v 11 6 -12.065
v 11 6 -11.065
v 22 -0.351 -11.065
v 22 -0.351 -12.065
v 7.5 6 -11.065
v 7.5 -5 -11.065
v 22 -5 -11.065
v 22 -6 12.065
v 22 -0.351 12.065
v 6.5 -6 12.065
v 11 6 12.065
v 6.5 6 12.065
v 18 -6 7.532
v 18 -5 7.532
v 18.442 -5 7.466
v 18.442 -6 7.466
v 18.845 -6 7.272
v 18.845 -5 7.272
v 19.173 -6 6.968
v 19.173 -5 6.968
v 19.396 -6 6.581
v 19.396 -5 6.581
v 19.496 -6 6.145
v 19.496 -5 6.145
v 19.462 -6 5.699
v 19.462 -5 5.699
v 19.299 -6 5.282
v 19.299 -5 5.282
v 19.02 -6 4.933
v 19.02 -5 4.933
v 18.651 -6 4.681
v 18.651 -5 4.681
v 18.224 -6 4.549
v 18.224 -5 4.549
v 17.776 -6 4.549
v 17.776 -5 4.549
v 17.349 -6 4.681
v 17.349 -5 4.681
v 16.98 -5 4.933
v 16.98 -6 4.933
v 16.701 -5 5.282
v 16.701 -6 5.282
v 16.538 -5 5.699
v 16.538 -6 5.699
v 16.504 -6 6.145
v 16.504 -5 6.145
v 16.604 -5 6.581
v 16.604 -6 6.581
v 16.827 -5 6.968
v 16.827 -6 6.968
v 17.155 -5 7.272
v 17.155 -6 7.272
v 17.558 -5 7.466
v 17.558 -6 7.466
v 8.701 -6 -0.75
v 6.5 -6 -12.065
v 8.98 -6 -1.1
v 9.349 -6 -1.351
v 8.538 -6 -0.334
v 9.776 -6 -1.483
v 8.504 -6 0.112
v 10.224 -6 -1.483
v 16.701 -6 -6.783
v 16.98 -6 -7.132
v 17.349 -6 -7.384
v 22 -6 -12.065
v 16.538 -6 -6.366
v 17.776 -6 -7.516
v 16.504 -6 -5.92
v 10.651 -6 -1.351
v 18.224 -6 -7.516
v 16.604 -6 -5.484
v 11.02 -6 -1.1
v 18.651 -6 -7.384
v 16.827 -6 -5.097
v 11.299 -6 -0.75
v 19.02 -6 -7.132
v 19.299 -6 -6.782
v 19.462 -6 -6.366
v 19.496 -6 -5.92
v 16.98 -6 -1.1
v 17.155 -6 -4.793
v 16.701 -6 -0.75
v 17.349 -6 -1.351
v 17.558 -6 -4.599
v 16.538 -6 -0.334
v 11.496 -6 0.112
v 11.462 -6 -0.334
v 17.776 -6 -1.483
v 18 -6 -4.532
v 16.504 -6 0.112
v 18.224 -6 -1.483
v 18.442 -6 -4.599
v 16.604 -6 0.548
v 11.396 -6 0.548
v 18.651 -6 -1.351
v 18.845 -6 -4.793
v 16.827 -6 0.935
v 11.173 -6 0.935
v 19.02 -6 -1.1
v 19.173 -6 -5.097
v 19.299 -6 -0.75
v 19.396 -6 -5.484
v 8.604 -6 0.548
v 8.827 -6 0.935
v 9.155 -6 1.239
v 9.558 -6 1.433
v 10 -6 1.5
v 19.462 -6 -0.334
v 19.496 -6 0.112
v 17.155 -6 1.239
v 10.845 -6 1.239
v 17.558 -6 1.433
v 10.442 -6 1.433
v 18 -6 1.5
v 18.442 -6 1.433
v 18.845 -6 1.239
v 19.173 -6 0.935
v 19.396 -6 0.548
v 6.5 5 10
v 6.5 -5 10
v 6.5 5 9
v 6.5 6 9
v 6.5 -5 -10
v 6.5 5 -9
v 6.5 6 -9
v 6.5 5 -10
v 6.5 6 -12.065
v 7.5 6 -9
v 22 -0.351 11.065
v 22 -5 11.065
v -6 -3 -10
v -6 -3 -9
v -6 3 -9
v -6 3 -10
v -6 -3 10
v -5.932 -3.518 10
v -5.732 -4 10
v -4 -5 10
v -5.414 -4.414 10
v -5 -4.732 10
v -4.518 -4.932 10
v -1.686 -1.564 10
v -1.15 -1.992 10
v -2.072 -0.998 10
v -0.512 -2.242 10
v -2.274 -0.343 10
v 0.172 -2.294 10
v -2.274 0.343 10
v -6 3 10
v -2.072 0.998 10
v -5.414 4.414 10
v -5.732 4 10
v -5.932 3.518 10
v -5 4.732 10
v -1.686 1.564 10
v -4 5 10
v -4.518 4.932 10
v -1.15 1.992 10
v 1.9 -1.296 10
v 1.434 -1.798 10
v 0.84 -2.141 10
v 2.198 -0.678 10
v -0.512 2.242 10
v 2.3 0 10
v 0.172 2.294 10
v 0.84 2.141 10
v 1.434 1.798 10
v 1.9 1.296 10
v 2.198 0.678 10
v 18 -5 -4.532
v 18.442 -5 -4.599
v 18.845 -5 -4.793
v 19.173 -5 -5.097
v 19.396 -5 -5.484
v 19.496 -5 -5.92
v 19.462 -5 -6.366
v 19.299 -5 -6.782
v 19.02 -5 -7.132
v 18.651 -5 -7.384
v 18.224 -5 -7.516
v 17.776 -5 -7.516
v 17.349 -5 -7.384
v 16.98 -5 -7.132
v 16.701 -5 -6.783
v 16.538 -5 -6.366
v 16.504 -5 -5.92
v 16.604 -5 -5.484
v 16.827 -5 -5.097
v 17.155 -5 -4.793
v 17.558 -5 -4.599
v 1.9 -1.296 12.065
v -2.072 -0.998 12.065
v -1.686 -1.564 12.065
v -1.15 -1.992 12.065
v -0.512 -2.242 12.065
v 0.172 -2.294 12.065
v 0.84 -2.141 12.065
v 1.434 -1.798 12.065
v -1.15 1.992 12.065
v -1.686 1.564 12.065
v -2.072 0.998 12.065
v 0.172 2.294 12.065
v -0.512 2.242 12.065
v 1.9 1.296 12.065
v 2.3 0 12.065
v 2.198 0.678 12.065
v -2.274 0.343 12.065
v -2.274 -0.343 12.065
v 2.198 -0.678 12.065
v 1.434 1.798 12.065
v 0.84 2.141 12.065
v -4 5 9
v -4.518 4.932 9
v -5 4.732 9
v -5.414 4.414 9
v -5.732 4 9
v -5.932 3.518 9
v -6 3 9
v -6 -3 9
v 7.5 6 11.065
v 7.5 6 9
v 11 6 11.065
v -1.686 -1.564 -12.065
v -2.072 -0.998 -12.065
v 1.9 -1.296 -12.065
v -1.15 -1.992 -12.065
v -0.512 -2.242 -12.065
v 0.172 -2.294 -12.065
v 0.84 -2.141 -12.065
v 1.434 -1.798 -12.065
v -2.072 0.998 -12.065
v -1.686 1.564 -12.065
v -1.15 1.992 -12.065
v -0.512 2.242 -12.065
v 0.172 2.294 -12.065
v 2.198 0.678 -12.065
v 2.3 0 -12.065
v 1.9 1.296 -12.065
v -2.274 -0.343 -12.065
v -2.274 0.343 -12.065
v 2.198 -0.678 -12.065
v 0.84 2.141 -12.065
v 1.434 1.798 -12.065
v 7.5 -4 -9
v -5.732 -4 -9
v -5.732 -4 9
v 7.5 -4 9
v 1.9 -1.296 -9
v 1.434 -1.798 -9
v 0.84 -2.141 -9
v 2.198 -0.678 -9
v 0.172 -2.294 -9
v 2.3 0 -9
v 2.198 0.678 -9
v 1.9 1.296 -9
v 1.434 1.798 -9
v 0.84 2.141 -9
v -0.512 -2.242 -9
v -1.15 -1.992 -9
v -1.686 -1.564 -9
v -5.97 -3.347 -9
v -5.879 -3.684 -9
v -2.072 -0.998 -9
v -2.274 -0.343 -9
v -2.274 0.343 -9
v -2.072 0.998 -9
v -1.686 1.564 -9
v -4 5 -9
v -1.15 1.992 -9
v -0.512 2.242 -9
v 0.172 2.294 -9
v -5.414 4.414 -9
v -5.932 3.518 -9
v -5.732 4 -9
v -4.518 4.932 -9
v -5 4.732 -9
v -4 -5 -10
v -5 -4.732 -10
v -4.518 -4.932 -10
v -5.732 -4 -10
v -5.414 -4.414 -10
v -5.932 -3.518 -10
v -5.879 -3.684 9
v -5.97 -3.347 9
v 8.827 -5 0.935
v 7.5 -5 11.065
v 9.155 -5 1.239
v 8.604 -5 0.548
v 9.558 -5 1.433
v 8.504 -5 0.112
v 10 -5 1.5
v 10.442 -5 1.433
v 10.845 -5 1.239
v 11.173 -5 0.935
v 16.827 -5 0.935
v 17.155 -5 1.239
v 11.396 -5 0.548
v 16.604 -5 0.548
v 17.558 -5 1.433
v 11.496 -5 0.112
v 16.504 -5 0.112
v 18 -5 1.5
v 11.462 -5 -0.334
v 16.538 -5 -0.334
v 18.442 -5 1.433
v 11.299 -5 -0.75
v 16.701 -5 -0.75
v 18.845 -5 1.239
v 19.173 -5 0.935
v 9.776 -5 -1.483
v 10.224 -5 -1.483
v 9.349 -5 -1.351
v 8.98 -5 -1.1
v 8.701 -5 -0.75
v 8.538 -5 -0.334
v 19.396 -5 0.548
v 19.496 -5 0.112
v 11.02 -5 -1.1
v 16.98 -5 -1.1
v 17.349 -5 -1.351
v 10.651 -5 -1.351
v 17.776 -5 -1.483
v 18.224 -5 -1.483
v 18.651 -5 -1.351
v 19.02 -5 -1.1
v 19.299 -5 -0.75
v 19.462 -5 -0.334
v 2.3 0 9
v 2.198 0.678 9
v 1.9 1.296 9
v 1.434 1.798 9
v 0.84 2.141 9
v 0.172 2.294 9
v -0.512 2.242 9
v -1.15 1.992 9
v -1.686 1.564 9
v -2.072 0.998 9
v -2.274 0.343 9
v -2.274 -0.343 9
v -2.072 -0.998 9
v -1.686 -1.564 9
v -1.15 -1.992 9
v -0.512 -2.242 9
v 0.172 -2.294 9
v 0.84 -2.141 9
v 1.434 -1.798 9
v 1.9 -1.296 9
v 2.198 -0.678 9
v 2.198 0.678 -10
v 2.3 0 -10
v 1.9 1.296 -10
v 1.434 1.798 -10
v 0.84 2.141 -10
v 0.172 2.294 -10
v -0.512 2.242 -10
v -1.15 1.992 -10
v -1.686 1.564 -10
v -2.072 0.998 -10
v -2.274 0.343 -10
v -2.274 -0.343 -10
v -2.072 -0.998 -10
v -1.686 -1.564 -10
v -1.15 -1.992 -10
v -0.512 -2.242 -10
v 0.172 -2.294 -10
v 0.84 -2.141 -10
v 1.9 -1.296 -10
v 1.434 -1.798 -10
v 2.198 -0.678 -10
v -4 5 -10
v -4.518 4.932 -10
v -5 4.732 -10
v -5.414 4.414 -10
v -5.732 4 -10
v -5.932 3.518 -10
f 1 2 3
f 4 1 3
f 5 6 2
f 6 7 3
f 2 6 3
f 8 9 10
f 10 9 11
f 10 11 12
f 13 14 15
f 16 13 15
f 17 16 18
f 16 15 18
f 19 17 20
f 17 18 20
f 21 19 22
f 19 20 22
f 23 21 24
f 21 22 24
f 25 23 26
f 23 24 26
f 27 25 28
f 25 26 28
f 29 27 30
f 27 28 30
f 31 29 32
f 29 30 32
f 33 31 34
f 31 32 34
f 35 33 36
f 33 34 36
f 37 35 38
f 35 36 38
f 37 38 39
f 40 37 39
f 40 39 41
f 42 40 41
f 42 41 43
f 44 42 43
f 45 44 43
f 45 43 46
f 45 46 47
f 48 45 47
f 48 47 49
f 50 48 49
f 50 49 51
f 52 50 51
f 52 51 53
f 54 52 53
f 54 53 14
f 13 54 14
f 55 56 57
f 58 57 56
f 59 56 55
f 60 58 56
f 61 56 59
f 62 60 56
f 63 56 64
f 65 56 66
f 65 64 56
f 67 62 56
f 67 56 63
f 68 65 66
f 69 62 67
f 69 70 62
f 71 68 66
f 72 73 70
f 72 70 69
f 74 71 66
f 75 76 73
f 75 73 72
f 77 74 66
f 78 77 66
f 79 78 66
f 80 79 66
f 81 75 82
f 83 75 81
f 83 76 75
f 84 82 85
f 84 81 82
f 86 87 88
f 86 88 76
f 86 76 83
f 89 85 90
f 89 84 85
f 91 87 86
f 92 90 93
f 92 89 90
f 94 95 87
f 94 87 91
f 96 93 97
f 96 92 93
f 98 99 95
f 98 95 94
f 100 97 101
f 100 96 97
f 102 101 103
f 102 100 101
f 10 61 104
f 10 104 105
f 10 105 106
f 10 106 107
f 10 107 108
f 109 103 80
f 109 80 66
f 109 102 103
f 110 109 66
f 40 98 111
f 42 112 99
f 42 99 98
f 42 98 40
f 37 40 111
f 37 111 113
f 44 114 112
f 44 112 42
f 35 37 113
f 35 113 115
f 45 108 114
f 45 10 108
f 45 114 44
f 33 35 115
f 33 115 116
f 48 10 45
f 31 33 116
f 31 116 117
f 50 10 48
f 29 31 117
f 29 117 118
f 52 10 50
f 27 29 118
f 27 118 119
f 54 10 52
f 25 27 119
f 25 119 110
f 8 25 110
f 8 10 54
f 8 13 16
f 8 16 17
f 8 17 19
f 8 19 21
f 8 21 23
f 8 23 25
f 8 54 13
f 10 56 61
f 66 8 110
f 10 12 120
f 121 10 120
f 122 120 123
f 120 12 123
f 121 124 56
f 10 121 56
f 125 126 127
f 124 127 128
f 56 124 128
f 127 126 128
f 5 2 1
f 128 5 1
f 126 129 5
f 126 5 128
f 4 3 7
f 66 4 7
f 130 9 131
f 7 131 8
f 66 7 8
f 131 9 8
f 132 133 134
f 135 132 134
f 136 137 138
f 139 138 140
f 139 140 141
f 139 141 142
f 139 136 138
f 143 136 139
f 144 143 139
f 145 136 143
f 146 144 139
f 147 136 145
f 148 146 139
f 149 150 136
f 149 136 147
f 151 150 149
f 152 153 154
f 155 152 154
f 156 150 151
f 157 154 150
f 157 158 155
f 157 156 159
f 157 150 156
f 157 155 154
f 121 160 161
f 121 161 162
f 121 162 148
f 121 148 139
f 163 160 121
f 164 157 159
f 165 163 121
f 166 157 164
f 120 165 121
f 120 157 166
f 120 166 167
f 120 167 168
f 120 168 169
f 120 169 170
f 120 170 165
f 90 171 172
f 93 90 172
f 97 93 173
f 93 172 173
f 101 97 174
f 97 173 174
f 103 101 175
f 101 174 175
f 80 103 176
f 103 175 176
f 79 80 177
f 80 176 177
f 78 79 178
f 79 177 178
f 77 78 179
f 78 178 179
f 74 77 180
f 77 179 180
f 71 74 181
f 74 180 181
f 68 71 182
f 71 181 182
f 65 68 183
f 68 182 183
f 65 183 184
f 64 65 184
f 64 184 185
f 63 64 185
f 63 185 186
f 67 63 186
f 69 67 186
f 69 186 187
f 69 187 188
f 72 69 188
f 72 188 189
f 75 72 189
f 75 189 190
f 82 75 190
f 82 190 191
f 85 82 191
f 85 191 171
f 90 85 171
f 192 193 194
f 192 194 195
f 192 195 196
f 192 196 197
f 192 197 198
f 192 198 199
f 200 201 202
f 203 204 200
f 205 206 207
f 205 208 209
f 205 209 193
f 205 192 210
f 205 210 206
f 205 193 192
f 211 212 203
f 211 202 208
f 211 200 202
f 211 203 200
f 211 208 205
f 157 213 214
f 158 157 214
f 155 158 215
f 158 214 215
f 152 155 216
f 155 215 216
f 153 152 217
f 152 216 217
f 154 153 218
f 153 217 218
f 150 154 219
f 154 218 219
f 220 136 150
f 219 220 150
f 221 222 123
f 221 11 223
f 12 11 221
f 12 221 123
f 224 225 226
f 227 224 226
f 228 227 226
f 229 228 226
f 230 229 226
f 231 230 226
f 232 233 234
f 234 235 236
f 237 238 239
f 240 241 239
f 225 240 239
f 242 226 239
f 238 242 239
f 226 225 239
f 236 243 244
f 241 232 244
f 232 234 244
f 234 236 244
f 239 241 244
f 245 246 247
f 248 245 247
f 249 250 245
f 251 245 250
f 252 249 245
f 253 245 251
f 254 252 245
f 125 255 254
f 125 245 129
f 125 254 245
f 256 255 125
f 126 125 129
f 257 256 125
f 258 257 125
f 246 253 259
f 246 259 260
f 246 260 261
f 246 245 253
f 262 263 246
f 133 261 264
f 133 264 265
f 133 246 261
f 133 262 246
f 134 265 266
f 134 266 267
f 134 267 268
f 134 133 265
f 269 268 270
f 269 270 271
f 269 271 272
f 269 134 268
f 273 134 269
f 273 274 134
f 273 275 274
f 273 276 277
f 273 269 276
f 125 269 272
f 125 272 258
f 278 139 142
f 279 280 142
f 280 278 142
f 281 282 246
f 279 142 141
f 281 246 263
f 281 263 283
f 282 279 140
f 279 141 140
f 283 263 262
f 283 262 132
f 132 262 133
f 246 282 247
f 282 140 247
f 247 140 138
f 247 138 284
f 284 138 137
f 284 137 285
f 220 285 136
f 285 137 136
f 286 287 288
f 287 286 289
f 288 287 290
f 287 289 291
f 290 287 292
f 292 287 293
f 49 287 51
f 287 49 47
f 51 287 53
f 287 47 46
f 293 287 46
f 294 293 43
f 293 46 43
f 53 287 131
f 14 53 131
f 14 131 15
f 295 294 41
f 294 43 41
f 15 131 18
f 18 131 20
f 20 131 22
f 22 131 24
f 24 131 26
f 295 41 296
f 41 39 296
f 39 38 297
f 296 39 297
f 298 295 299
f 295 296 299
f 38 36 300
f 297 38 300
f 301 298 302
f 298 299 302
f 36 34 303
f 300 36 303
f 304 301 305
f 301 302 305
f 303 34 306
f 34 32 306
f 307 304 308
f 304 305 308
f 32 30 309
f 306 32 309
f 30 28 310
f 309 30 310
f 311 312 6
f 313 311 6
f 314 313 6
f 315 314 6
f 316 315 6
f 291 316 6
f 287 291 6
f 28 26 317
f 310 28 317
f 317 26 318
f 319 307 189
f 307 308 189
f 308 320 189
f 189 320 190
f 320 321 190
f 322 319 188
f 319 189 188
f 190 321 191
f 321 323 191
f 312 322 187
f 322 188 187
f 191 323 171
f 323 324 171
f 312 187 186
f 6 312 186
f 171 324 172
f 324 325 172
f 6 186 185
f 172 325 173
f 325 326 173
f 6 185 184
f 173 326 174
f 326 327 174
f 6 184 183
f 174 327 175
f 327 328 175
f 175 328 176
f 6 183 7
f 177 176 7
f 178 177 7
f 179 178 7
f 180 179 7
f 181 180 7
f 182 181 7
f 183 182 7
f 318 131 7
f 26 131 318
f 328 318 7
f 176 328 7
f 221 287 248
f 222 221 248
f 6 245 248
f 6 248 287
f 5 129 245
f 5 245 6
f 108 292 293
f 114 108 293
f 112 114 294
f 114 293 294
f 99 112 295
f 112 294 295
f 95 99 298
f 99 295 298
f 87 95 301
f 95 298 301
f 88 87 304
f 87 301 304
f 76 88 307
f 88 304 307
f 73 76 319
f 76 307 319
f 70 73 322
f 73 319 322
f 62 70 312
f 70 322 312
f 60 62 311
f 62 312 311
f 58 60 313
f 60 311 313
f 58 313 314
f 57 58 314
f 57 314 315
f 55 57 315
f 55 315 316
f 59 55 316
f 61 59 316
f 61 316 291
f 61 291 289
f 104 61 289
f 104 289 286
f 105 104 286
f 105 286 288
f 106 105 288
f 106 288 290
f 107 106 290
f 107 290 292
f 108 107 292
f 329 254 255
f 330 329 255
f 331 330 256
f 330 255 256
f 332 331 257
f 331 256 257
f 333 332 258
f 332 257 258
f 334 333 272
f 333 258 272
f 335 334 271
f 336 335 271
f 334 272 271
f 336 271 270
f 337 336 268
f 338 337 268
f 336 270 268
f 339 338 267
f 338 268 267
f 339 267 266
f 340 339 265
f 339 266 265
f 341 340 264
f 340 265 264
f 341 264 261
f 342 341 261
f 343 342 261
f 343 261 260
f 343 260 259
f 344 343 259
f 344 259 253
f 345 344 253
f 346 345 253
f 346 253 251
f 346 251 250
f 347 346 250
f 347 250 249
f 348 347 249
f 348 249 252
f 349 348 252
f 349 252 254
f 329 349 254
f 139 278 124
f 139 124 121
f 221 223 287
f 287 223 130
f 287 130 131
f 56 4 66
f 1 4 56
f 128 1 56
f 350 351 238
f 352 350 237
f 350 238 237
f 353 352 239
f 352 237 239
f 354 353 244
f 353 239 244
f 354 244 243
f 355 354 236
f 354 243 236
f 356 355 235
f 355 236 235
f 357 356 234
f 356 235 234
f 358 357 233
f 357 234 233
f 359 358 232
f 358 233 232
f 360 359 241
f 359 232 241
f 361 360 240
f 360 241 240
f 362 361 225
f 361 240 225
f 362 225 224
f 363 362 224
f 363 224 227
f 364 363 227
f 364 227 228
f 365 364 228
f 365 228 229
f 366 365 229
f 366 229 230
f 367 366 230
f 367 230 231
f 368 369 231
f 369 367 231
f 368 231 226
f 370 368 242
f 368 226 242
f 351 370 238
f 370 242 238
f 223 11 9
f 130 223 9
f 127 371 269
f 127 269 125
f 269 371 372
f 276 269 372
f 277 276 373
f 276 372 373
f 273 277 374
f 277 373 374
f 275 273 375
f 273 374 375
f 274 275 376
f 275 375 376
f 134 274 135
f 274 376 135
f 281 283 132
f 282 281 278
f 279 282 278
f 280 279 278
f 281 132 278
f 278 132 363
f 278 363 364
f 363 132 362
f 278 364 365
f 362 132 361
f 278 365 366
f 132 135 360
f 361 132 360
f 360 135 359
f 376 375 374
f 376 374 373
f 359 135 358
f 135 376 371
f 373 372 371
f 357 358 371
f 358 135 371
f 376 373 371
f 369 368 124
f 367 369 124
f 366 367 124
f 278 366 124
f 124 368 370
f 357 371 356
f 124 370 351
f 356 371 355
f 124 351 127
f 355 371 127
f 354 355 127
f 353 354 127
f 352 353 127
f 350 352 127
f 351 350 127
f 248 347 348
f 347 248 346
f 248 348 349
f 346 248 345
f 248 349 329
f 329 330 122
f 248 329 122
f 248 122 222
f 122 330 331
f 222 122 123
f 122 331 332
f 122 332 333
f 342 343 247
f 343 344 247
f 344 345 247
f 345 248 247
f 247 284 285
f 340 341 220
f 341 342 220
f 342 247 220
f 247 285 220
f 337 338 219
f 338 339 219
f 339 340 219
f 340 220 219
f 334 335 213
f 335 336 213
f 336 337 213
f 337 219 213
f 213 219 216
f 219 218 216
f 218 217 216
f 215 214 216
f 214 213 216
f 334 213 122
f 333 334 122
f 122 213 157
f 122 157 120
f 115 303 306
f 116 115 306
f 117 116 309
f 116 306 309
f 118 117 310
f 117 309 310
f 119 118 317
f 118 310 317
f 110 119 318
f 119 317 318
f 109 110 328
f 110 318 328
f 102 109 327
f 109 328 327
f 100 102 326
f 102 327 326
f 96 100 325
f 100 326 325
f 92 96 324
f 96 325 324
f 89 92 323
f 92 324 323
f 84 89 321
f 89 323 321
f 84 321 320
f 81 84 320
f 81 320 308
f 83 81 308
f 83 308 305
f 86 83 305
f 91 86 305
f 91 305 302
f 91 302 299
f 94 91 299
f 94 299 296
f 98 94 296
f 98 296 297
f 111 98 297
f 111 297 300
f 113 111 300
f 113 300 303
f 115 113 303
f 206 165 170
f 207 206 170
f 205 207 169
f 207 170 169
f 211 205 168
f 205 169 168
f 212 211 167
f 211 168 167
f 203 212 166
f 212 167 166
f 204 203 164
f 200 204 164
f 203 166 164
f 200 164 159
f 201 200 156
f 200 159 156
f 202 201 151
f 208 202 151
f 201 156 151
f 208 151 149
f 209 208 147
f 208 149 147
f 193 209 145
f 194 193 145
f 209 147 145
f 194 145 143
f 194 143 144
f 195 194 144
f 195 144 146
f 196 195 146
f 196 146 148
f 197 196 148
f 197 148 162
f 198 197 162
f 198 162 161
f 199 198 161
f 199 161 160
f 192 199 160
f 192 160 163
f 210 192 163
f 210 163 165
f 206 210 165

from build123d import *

# Parameters (mm, degrees)
SKETCH1_R           = 2.3
BOSS_EXTRUDE1_DEPTH = 12.065
SKETCH5_R           = 1.5
SKETCH5_W           = 12.5
SKETCH5_H           = 2.065
CUT_EXTRUDE3_DEPTH  = 28.813022579
SKETCH6_W           = 18
SKETCH6_H           = 10
CUT_EXTRUDE5_DEPTH  = 32.07352933
SKETCH9_W           = 20
SKETCH9_H           = 1
CUT_EXTRUDE8_DEPTH  = 12.5
BOSS_EXTRUDE2_START = -24.13
SKETCH7_R           = 2.3
BOSS_EXTRUDE2_DEPTH = 24.13
SKETCH8_W           = 12.5
SKETCH8_H           = 1
CUT_EXTRUDE6_DEPTH  = 1
FILLET3_R           = 2
CUT_EXTRUDE9_DEPTH  = 14.5


with BuildPart() as part:
    # Sketch1 → Boss-Extrude1 (new, symmetric)
    with BuildSketch(Plane.XY):
        Polygon((22, -6), (0, -6), (-6, -6), (-6, 6), (0, 6), (11, 6), (22, -0.350852961), align=None)
        with Locations(Location((0, 0, 0), (0, 0, 180))):
            Circle(SKETCH1_R, mode=Mode.SUBTRACT)
    extrude(amount=BOSS_EXTRUDE1_DEPTH, both=True)

    # Sketch5 → Cut-Extrude3 (cut, through all)
    with BuildSketch(Plane(origin=(0, 6, 0), x_dir=(1, 0, 0), z_dir=(0, 1, 0))):
        with Locations(Location((18, 6.0325, 0), (0, 0, 270))):
            Circle(SKETCH5_R)
        with Locations(Location((18, 0, 0), (0, 0, 270))):
            Circle(SKETCH5_R)
        with Locations(Location((18, -6.0325, 0), (0, 0, 270))):
            Circle(SKETCH5_R)
        with Locations(Location((10, 0, 0), (0, 0, 270))):
            Circle(SKETCH5_R)
        with Locations((0.25, -11.0325)):
            Rectangle(SKETCH5_W, SKETCH5_H)
        with Locations((0.25, 11.0325)):
            Rectangle(SKETCH5_W, SKETCH5_H)
    extrude(amount=-CUT_EXTRUDE3_DEPTH, mode=Mode.SUBTRACT)

    # Sketch6 → Cut-Extrude5 (cut, through all)
    with BuildSketch(Plane.ZY.offset(6)):
        with Locations((0, 1)):
            Rectangle(SKETCH6_W, SKETCH6_H)
    extrude(amount=-CUT_EXTRUDE5_DEPTH, mode=Mode.SUBTRACT)

    # Sketch9 → Cut-Extrude8 (cut)
    with BuildSketch(Plane.ZY.offset(6)):
        with Locations((0, -5.5)):
            Rectangle(SKETCH9_W, SKETCH9_H)
    extrude(amount=-CUT_EXTRUDE8_DEPTH, mode=Mode.SUBTRACT)

    # Sketch7 → Boss-Extrude2 (add)
    with BuildSketch(Plane.XY.offset(12.065).offset(BOSS_EXTRUDE2_START)):
        Circle(SKETCH7_R)
    extrude(amount=BOSS_EXTRUDE2_DEPTH)

    # Sketch8 → Cut-Extrude6 (cut)
    with BuildSketch(Plane(origin=(0, 6, 0), x_dir=(1, 0, 0), z_dir=(0, 1, 0))):
        with Locations((0.25, -9.5)):
            Rectangle(SKETCH8_W, SKETCH8_H)
        with Locations((0.25, 9.5)):
            Rectangle(SKETCH8_W, SKETCH8_H)
    extrude(amount=-CUT_EXTRUDE6_DEPTH, mode=Mode.SUBTRACT)

    # Fillet3
    # the kernel refuses this fillet: 2 mm, written as the material it takes off along each edge
    with BuildSketch(Plane(origin=(-6, -5, 15), x_dir=(1, 0, 0), z_dir=(0, 0, -1))) as fillet3_piece_1:
        with BuildLine():
            CenterArc((FILLET3_R, -FILLET3_R), FILLET3_R, 90, 90)
            Line((0, -FILLET3_R), (0, 0))
            Line((0, 0), (FILLET3_R, 0))
        make_face()
    extrude(amount=30, mode=Mode.SUBTRACT)
    with BuildSketch(Plane(origin=(-6, 5, -15), x_dir=(1, 0, 0), z_dir=(0, 0, 1)), Plane(origin=(-6, 5, 4), x_dir=(1, 0, 0), z_dir=(0, 0, 1))) as fillet3_piece_2:
        with BuildLine():
            CenterArc((FILLET3_R, -FILLET3_R), FILLET3_R, 90, 90)
            Line((0, -FILLET3_R), (0, 0))
            Line((0, 0), (FILLET3_R, 0))
        make_face()
    extrude(amount=11, mode=Mode.SUBTRACT)

    # Sketch10 → Cut-Extrude9 (cut)
    with BuildSketch(Plane(origin=(22, 0, 0), x_dir=(0, 0, -1), z_dir=(1, 0, 0))):
        Polygon((-9, -4), (-9, 6), (-11.065, 6), (-11.065, -4), (-11.065, -5), (11.065, -5), (11.065, -4), (11.065, 6), (9, 6), (9, -4), align=None)
    extrude(amount=-CUT_EXTRUDE9_DEPTH, mode=Mode.SUBTRACT)


solid = part.part
